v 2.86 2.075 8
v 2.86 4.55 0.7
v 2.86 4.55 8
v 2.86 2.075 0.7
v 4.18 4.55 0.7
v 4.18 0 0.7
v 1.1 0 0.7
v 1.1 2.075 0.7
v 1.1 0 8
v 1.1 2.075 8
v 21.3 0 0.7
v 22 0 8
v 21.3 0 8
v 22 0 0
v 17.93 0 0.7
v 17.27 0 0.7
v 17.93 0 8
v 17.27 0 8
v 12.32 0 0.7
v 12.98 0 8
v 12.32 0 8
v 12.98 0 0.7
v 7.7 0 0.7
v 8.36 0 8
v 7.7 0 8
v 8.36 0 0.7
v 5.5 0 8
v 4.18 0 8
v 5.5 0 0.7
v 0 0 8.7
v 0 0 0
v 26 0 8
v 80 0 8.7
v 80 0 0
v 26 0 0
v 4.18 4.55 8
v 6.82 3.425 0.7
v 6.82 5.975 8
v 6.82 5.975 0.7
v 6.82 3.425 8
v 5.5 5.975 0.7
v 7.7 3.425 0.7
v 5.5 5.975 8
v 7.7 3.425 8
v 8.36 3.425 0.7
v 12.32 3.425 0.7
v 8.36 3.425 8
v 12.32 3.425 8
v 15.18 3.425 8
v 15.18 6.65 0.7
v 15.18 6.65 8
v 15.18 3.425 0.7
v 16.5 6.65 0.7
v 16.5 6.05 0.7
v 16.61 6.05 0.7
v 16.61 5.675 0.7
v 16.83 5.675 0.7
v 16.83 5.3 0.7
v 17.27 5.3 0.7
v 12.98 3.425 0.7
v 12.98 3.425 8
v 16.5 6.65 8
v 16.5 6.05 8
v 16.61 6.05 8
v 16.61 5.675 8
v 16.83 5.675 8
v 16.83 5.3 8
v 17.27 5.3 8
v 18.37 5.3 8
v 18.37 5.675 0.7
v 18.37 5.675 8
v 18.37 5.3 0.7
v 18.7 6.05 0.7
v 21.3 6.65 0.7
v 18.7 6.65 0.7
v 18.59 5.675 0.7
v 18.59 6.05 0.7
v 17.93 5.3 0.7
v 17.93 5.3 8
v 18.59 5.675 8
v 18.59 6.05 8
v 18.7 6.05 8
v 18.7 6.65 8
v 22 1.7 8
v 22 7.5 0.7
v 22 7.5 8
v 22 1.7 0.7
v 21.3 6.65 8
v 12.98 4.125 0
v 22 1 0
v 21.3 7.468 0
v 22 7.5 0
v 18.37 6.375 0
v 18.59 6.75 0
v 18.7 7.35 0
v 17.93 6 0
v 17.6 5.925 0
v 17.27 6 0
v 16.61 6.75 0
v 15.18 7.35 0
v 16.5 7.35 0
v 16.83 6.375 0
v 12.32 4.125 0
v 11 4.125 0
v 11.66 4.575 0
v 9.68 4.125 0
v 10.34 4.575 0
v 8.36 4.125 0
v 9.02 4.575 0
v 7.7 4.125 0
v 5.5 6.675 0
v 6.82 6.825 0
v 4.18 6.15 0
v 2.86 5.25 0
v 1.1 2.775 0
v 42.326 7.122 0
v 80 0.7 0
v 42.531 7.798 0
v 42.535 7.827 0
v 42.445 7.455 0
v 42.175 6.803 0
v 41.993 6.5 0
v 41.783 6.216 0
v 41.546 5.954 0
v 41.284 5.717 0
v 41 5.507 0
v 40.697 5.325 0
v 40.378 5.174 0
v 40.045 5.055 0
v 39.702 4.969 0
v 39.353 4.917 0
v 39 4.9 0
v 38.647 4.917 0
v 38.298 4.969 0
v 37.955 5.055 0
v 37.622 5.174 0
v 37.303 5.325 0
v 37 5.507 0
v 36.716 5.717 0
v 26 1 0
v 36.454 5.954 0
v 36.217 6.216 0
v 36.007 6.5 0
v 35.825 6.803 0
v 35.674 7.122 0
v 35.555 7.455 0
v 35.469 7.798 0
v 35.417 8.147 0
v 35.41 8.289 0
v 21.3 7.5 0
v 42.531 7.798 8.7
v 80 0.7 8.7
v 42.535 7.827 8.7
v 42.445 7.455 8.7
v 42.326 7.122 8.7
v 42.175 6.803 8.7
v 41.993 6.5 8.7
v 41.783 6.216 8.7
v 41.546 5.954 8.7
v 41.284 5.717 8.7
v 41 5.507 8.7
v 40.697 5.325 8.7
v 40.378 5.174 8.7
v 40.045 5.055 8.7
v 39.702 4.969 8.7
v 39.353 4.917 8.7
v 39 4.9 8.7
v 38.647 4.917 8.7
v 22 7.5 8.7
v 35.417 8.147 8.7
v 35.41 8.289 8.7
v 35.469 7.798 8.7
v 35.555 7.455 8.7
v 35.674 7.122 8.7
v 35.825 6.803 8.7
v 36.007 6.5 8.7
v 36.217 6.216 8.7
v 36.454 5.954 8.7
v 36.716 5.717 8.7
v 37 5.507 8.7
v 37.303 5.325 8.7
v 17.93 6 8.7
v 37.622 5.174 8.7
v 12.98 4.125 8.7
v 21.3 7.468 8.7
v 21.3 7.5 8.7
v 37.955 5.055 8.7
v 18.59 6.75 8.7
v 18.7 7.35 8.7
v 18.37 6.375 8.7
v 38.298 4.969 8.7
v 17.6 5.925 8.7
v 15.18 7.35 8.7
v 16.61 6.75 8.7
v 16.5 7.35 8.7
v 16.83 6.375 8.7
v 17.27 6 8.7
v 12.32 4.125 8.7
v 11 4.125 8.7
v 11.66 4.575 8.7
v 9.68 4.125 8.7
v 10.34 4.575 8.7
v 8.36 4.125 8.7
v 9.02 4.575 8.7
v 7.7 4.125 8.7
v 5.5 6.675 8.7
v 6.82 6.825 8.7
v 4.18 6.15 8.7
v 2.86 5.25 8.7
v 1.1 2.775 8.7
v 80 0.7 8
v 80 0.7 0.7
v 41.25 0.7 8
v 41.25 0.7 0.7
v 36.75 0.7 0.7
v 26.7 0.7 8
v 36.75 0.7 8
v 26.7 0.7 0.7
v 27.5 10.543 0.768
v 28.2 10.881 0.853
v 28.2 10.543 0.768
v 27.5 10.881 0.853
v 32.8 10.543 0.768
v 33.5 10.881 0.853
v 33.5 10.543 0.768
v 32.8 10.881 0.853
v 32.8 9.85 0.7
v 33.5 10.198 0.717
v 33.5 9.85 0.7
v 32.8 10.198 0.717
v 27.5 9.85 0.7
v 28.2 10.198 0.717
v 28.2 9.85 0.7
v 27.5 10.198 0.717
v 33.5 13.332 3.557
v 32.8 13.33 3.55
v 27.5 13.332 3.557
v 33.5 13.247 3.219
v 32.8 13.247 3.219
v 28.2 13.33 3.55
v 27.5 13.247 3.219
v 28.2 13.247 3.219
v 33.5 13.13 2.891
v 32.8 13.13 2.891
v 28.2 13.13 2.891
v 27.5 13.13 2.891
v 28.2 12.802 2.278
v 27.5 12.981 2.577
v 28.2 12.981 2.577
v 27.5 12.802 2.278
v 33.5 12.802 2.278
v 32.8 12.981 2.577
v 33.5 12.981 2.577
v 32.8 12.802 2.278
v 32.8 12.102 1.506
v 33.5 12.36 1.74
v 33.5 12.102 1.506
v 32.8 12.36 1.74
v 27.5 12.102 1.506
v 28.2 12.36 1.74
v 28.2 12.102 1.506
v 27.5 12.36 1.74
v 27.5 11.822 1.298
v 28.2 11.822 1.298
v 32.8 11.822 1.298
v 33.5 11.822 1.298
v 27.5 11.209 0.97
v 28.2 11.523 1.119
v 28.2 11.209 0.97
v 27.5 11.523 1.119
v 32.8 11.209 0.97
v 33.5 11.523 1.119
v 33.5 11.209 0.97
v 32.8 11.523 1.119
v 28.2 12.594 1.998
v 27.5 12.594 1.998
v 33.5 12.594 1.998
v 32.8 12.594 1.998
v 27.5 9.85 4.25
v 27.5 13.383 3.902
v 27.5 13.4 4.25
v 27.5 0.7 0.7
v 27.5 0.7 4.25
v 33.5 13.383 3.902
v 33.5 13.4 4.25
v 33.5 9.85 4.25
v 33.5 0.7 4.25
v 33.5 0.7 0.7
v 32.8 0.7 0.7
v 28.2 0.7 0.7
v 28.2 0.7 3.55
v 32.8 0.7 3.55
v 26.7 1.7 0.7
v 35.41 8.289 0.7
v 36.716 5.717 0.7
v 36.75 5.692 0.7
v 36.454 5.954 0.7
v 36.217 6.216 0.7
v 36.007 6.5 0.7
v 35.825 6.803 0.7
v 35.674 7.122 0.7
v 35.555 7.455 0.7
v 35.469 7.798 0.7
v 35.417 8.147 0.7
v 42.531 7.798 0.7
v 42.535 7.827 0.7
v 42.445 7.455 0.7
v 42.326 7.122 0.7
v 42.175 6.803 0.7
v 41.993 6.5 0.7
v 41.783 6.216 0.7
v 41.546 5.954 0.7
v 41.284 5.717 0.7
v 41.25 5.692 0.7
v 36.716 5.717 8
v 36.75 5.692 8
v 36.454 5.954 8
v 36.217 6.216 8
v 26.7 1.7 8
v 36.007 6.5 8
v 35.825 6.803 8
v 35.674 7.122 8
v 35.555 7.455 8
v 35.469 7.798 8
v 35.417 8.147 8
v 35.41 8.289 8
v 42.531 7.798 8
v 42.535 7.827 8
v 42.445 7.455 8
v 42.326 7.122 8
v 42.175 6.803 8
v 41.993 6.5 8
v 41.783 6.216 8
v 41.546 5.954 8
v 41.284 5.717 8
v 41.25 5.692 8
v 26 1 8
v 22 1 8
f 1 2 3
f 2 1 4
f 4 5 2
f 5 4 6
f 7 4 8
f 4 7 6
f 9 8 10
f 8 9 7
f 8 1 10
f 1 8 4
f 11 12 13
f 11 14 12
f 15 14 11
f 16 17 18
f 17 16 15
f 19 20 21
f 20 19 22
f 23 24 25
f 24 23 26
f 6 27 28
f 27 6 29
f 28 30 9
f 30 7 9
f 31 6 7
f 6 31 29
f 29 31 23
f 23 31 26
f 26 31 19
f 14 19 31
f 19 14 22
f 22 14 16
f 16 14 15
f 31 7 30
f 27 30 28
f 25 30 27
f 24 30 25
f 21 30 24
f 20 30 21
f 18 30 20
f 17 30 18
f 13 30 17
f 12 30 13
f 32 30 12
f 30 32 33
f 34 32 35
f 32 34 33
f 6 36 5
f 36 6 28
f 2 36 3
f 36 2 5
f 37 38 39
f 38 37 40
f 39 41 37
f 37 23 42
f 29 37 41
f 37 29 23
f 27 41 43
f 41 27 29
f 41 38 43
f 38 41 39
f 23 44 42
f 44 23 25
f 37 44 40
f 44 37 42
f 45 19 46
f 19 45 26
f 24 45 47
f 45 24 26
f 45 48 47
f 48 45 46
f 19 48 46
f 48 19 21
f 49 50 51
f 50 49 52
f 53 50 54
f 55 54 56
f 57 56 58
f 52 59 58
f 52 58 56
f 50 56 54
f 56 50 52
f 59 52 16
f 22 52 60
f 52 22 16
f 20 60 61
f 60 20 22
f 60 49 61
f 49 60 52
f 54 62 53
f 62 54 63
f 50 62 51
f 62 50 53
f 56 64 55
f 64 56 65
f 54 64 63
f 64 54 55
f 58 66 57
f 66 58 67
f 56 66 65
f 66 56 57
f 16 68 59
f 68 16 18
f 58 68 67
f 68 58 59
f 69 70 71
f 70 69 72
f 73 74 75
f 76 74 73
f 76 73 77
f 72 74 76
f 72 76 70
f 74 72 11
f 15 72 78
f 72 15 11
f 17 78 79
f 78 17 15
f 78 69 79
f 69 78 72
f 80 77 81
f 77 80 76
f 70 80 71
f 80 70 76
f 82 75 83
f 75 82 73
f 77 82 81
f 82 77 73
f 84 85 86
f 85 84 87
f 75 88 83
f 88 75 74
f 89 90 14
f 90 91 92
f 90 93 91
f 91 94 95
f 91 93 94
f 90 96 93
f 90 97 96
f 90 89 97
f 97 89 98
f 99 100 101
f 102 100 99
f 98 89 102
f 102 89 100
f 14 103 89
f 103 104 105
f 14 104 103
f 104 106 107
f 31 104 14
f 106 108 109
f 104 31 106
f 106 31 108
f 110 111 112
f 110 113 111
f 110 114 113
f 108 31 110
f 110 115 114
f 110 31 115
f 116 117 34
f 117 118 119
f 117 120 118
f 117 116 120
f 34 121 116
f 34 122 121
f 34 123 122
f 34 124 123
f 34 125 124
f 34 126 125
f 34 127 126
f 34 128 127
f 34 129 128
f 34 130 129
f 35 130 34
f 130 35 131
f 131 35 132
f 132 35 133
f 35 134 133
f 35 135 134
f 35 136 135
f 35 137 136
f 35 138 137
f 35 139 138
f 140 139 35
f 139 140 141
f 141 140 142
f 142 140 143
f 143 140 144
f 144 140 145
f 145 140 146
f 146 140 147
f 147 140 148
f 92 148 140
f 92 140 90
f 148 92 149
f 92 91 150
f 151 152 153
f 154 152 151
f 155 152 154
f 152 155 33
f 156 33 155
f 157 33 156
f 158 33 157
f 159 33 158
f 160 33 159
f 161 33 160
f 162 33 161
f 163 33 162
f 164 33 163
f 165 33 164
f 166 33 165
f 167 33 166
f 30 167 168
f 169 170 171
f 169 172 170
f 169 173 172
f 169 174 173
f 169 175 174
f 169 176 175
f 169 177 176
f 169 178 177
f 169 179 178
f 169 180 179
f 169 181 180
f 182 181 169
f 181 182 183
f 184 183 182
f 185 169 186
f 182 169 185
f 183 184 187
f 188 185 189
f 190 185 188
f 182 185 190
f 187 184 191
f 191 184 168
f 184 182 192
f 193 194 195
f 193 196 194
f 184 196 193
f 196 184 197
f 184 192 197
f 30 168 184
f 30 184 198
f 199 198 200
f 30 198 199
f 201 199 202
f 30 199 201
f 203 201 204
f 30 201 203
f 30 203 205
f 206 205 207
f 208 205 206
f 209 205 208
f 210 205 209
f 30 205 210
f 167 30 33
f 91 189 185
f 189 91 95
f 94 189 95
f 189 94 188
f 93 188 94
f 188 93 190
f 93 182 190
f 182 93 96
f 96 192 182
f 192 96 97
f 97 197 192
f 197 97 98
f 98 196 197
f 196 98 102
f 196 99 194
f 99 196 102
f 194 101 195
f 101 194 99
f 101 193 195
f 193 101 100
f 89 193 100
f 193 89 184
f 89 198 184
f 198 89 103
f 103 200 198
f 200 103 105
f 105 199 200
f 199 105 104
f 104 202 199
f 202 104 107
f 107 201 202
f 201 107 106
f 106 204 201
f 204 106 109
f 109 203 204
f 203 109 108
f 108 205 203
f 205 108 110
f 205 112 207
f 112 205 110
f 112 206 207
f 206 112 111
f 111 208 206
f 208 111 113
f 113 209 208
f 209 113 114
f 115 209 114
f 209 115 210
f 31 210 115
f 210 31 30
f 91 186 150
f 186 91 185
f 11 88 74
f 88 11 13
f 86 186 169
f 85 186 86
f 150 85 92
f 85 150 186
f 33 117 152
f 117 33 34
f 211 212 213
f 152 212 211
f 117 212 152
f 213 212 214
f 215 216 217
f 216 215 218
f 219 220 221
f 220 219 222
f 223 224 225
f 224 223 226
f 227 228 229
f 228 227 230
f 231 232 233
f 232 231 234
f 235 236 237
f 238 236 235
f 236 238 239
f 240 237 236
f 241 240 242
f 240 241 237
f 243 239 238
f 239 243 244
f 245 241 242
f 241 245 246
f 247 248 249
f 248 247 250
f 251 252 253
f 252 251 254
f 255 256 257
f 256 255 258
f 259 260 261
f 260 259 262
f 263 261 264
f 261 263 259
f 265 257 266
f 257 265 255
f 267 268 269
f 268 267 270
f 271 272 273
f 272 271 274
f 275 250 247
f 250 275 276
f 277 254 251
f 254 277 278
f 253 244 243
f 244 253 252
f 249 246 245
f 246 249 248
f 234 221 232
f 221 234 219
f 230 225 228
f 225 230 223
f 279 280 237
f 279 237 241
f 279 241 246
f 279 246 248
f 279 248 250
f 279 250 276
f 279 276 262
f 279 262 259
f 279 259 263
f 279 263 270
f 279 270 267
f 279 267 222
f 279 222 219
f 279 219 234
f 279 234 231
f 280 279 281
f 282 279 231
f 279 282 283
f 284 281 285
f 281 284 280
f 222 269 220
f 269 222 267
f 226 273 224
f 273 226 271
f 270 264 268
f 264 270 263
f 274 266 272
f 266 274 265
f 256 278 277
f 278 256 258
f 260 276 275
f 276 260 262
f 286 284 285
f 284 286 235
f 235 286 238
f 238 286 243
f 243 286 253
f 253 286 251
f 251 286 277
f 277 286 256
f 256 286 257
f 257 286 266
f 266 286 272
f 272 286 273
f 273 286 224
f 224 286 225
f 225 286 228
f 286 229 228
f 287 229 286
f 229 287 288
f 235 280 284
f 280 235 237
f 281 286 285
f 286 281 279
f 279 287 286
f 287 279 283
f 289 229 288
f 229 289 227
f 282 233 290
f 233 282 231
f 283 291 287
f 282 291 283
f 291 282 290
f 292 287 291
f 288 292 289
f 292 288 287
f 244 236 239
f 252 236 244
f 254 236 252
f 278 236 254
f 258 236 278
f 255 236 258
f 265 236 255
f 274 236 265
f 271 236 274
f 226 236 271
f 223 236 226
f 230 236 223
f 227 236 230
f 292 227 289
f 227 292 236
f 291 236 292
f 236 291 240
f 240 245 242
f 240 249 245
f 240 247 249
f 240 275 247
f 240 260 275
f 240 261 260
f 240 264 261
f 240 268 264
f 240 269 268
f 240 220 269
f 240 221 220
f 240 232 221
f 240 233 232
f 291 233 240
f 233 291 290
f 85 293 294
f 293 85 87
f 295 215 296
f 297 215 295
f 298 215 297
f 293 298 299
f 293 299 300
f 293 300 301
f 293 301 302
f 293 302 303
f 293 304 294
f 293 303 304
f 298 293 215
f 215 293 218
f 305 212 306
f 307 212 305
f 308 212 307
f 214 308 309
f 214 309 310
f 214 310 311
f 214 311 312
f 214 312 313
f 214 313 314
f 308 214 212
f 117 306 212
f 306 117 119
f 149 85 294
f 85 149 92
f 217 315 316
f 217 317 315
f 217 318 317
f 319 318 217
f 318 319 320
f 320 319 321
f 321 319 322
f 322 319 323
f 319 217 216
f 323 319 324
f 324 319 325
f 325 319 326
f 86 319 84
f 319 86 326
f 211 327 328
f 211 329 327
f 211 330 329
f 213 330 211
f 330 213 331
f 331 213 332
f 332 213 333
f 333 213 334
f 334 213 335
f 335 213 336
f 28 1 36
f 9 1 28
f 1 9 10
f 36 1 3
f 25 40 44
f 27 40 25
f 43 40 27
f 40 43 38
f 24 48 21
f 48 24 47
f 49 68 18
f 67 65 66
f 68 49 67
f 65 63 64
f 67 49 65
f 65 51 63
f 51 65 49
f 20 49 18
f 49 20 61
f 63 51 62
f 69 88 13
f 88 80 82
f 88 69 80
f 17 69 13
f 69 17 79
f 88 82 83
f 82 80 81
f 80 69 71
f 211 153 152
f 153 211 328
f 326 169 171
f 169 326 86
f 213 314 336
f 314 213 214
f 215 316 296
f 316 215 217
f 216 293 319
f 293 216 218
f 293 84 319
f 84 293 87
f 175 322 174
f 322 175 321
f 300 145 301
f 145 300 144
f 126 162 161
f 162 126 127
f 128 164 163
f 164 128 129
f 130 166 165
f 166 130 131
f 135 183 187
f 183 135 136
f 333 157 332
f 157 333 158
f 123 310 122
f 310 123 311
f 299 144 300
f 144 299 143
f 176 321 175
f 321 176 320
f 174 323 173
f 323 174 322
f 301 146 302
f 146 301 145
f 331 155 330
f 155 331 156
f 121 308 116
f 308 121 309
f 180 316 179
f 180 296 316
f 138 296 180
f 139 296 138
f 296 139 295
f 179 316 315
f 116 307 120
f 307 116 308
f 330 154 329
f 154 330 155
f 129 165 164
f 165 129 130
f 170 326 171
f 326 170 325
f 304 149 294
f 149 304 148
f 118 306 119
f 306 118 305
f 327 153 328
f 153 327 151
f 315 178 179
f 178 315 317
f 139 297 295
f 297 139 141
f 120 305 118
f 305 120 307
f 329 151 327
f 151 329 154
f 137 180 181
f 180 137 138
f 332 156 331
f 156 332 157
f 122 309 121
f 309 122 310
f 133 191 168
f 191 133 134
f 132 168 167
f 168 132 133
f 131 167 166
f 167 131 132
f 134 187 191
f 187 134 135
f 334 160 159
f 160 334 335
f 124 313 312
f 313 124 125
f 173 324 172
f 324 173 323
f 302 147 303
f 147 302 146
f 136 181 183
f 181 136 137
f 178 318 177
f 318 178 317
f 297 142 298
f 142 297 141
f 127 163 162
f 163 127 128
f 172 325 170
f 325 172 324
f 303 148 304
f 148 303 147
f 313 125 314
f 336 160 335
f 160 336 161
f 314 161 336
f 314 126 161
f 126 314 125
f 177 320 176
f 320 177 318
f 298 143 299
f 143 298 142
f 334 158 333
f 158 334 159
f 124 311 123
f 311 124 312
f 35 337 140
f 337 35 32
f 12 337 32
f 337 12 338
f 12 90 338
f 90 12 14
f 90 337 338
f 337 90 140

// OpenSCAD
$fn = 64;

// total length of pin
length = 80;
// width of pin
width = 8.7;

// hole diameter for spring
spring_d = 7.2;

// spring support width
spring_support_w = 4.5;

// height at middle
center_height = 8.5;

// height at head-end
head_height = 7.5;

// distance from head to bolt notch
head_length = 22;

// skip following steps of head-hole-creation
skip_head_holes_ixs = [0, 3, 6, 13, 19, 20];

// distance from head-end to spring notch center
middle_length = 17;

// groove width of bolt notch
bolt_notch_width = 4;

// groove height of bolt notch
bolt_notch_height = 1;

// spacer length
spacer_l = 6;

// spacer height
spacer_h = 12;

// distance between spacer and mid-point
spacer_dist = 0.1;

// hanging hole diameter
hanging_hole_d = 0;

// hanging hole distance from pin end
hanging_hole_dist = 5.5;

extruder_width = 0.35;
wall_thickness = extruder_width * 2;

head_profile_pct = [
    // slope upwards
        [0, 0], [5, 37], [13, 70], [19, 82], [25, 89], [31, 91],
    // first notch with tines
        [35, 55], [38, 55], [41, 61], [44, 55], [47, 61],
        [50, 55], [53, 61], [56, 55], [59, 55], [69, 98],
    // second notch rounded
        [75, 98],
        [75.5, 90], [76.5, 85], [78.5, 80],
        [80, 79],
        [81.5, 80], [83.5, 85], [84.5, 90],
        [85, 98],
    // head-end
        [100, 100], [100, 0]
    ];

head_profile = head_profile_pct * [[head_length / 100, 0], [0, head_height / 100]];
spring_center = head_length + middle_length;


module profile_wall() {
    linear_extrude(wall_thickness)
        union() {
            polygon([
                    [0, 0], [length, 0], [length, wall_thickness],
                    [spring_center, center_height], [head_length, head_height],
                    [head_length, wall_thickness]
                ]);
            polygon(head_profile);
        }
}

module head_roof() {
    inner_w = width - 2 * wall_thickness;
    difference() {
        linear_extrude(width)
            polygon(head_profile);
        translate([0, 0, wall_thickness])
            for (i = [1: len(head_profile) - 2]) {
                if (!search(i, skip_head_holes_ixs)) {
                    p0 = head_profile[i];
                    p1 = head_profile[i + 1];
                    translate([p0.x, 0, 0])
                        cube([p1.x - p0.x, min(p0.y, p1.y) - wall_thickness, inner_w]);
                }}
    }
    translate([head_length - wall_thickness, 0, 0])
        cube([wall_thickness, head_height, width]);
}

module pin_floor() {
    difference() {
        translate([head_length + bolt_notch_width, 0, 0])
            cube([length - head_length - bolt_notch_width, wall_thickness, width]);
        translate([length - hanging_hole_dist, 0, width / 2])
            rotate([- 90, 0, 0])
                cylinder(d = hanging_hole_d, h = wall_thickness);
    }
}

module spacer() {
    spacer_w = width / 2 - wall_thickness - spacer_dist;
    straight_spacer_h = spacer_h - spacer_w + wall_thickness;
    translate([head_length + middle_length / 2 - spacer_l / 2, wall_thickness, wall_thickness]) {
        difference() {
            union() {
                cube([spacer_l, straight_spacer_h, spacer_w]);
                difference() {
                    translate([0, straight_spacer_h, spacer_w]) {
                        rotate([0, 90, 0])
                            cylinder(r = spacer_w, h = spacer_l);
                    }
                    cube([spacer_l, straight_spacer_h, spacer_l]);
                    translate([0, wall_thickness, spacer_w])
                        cube([spacer_l, spacer_h, spacer_l]);
                }
            }
            color("green")
                translate([wall_thickness, 0, 0])
                    cube([spacer_l - 2 * wall_thickness, spacer_h + wall_thickness, spacer_w - wall_thickness]);
        }}
}

module spring_support() {
    translate([spring_center - spring_support_w / 2, 0, 0])
        cube([spring_support_w, center_height, width]);
}

module bolt_notch() {
    translate([head_length, 0, 0])
        cube([bolt_notch_width + wall_thickness, bolt_notch_height + wall_thickness, width]);
}

module spring_hole() {
    translate([spring_center, center_height, 0])
        cylinder(d = spring_d, h = width);
}

module bolt_notch_hole() {
    translate([head_length, 0, 0])
        cube([bolt_notch_width, bolt_notch_height, width - wall_thickness]);
}

difference() {
    union() {
        profile_wall();
        translate([0, 0, width - wall_thickness])  profile_wall();
        head_roof();
        pin_floor();
        spacer();
        spring_support();
        bolt_notch();
    }
    spring_hole();
    bolt_notch_hole();
}

module calculate_spring_arm_distance() {
    center_dist = sqrt((middle_length - bolt_notch_width)^2 + (center_height - bolt_notch_height)^2);
    tanget_dist = sqrt(center_dist^2 - (spring_d / 2)^2);
    echo("Distance bolt notch corner closest to spring tangential to spring:", tanget_dist);
}

calculate_spring_arm_distance();
